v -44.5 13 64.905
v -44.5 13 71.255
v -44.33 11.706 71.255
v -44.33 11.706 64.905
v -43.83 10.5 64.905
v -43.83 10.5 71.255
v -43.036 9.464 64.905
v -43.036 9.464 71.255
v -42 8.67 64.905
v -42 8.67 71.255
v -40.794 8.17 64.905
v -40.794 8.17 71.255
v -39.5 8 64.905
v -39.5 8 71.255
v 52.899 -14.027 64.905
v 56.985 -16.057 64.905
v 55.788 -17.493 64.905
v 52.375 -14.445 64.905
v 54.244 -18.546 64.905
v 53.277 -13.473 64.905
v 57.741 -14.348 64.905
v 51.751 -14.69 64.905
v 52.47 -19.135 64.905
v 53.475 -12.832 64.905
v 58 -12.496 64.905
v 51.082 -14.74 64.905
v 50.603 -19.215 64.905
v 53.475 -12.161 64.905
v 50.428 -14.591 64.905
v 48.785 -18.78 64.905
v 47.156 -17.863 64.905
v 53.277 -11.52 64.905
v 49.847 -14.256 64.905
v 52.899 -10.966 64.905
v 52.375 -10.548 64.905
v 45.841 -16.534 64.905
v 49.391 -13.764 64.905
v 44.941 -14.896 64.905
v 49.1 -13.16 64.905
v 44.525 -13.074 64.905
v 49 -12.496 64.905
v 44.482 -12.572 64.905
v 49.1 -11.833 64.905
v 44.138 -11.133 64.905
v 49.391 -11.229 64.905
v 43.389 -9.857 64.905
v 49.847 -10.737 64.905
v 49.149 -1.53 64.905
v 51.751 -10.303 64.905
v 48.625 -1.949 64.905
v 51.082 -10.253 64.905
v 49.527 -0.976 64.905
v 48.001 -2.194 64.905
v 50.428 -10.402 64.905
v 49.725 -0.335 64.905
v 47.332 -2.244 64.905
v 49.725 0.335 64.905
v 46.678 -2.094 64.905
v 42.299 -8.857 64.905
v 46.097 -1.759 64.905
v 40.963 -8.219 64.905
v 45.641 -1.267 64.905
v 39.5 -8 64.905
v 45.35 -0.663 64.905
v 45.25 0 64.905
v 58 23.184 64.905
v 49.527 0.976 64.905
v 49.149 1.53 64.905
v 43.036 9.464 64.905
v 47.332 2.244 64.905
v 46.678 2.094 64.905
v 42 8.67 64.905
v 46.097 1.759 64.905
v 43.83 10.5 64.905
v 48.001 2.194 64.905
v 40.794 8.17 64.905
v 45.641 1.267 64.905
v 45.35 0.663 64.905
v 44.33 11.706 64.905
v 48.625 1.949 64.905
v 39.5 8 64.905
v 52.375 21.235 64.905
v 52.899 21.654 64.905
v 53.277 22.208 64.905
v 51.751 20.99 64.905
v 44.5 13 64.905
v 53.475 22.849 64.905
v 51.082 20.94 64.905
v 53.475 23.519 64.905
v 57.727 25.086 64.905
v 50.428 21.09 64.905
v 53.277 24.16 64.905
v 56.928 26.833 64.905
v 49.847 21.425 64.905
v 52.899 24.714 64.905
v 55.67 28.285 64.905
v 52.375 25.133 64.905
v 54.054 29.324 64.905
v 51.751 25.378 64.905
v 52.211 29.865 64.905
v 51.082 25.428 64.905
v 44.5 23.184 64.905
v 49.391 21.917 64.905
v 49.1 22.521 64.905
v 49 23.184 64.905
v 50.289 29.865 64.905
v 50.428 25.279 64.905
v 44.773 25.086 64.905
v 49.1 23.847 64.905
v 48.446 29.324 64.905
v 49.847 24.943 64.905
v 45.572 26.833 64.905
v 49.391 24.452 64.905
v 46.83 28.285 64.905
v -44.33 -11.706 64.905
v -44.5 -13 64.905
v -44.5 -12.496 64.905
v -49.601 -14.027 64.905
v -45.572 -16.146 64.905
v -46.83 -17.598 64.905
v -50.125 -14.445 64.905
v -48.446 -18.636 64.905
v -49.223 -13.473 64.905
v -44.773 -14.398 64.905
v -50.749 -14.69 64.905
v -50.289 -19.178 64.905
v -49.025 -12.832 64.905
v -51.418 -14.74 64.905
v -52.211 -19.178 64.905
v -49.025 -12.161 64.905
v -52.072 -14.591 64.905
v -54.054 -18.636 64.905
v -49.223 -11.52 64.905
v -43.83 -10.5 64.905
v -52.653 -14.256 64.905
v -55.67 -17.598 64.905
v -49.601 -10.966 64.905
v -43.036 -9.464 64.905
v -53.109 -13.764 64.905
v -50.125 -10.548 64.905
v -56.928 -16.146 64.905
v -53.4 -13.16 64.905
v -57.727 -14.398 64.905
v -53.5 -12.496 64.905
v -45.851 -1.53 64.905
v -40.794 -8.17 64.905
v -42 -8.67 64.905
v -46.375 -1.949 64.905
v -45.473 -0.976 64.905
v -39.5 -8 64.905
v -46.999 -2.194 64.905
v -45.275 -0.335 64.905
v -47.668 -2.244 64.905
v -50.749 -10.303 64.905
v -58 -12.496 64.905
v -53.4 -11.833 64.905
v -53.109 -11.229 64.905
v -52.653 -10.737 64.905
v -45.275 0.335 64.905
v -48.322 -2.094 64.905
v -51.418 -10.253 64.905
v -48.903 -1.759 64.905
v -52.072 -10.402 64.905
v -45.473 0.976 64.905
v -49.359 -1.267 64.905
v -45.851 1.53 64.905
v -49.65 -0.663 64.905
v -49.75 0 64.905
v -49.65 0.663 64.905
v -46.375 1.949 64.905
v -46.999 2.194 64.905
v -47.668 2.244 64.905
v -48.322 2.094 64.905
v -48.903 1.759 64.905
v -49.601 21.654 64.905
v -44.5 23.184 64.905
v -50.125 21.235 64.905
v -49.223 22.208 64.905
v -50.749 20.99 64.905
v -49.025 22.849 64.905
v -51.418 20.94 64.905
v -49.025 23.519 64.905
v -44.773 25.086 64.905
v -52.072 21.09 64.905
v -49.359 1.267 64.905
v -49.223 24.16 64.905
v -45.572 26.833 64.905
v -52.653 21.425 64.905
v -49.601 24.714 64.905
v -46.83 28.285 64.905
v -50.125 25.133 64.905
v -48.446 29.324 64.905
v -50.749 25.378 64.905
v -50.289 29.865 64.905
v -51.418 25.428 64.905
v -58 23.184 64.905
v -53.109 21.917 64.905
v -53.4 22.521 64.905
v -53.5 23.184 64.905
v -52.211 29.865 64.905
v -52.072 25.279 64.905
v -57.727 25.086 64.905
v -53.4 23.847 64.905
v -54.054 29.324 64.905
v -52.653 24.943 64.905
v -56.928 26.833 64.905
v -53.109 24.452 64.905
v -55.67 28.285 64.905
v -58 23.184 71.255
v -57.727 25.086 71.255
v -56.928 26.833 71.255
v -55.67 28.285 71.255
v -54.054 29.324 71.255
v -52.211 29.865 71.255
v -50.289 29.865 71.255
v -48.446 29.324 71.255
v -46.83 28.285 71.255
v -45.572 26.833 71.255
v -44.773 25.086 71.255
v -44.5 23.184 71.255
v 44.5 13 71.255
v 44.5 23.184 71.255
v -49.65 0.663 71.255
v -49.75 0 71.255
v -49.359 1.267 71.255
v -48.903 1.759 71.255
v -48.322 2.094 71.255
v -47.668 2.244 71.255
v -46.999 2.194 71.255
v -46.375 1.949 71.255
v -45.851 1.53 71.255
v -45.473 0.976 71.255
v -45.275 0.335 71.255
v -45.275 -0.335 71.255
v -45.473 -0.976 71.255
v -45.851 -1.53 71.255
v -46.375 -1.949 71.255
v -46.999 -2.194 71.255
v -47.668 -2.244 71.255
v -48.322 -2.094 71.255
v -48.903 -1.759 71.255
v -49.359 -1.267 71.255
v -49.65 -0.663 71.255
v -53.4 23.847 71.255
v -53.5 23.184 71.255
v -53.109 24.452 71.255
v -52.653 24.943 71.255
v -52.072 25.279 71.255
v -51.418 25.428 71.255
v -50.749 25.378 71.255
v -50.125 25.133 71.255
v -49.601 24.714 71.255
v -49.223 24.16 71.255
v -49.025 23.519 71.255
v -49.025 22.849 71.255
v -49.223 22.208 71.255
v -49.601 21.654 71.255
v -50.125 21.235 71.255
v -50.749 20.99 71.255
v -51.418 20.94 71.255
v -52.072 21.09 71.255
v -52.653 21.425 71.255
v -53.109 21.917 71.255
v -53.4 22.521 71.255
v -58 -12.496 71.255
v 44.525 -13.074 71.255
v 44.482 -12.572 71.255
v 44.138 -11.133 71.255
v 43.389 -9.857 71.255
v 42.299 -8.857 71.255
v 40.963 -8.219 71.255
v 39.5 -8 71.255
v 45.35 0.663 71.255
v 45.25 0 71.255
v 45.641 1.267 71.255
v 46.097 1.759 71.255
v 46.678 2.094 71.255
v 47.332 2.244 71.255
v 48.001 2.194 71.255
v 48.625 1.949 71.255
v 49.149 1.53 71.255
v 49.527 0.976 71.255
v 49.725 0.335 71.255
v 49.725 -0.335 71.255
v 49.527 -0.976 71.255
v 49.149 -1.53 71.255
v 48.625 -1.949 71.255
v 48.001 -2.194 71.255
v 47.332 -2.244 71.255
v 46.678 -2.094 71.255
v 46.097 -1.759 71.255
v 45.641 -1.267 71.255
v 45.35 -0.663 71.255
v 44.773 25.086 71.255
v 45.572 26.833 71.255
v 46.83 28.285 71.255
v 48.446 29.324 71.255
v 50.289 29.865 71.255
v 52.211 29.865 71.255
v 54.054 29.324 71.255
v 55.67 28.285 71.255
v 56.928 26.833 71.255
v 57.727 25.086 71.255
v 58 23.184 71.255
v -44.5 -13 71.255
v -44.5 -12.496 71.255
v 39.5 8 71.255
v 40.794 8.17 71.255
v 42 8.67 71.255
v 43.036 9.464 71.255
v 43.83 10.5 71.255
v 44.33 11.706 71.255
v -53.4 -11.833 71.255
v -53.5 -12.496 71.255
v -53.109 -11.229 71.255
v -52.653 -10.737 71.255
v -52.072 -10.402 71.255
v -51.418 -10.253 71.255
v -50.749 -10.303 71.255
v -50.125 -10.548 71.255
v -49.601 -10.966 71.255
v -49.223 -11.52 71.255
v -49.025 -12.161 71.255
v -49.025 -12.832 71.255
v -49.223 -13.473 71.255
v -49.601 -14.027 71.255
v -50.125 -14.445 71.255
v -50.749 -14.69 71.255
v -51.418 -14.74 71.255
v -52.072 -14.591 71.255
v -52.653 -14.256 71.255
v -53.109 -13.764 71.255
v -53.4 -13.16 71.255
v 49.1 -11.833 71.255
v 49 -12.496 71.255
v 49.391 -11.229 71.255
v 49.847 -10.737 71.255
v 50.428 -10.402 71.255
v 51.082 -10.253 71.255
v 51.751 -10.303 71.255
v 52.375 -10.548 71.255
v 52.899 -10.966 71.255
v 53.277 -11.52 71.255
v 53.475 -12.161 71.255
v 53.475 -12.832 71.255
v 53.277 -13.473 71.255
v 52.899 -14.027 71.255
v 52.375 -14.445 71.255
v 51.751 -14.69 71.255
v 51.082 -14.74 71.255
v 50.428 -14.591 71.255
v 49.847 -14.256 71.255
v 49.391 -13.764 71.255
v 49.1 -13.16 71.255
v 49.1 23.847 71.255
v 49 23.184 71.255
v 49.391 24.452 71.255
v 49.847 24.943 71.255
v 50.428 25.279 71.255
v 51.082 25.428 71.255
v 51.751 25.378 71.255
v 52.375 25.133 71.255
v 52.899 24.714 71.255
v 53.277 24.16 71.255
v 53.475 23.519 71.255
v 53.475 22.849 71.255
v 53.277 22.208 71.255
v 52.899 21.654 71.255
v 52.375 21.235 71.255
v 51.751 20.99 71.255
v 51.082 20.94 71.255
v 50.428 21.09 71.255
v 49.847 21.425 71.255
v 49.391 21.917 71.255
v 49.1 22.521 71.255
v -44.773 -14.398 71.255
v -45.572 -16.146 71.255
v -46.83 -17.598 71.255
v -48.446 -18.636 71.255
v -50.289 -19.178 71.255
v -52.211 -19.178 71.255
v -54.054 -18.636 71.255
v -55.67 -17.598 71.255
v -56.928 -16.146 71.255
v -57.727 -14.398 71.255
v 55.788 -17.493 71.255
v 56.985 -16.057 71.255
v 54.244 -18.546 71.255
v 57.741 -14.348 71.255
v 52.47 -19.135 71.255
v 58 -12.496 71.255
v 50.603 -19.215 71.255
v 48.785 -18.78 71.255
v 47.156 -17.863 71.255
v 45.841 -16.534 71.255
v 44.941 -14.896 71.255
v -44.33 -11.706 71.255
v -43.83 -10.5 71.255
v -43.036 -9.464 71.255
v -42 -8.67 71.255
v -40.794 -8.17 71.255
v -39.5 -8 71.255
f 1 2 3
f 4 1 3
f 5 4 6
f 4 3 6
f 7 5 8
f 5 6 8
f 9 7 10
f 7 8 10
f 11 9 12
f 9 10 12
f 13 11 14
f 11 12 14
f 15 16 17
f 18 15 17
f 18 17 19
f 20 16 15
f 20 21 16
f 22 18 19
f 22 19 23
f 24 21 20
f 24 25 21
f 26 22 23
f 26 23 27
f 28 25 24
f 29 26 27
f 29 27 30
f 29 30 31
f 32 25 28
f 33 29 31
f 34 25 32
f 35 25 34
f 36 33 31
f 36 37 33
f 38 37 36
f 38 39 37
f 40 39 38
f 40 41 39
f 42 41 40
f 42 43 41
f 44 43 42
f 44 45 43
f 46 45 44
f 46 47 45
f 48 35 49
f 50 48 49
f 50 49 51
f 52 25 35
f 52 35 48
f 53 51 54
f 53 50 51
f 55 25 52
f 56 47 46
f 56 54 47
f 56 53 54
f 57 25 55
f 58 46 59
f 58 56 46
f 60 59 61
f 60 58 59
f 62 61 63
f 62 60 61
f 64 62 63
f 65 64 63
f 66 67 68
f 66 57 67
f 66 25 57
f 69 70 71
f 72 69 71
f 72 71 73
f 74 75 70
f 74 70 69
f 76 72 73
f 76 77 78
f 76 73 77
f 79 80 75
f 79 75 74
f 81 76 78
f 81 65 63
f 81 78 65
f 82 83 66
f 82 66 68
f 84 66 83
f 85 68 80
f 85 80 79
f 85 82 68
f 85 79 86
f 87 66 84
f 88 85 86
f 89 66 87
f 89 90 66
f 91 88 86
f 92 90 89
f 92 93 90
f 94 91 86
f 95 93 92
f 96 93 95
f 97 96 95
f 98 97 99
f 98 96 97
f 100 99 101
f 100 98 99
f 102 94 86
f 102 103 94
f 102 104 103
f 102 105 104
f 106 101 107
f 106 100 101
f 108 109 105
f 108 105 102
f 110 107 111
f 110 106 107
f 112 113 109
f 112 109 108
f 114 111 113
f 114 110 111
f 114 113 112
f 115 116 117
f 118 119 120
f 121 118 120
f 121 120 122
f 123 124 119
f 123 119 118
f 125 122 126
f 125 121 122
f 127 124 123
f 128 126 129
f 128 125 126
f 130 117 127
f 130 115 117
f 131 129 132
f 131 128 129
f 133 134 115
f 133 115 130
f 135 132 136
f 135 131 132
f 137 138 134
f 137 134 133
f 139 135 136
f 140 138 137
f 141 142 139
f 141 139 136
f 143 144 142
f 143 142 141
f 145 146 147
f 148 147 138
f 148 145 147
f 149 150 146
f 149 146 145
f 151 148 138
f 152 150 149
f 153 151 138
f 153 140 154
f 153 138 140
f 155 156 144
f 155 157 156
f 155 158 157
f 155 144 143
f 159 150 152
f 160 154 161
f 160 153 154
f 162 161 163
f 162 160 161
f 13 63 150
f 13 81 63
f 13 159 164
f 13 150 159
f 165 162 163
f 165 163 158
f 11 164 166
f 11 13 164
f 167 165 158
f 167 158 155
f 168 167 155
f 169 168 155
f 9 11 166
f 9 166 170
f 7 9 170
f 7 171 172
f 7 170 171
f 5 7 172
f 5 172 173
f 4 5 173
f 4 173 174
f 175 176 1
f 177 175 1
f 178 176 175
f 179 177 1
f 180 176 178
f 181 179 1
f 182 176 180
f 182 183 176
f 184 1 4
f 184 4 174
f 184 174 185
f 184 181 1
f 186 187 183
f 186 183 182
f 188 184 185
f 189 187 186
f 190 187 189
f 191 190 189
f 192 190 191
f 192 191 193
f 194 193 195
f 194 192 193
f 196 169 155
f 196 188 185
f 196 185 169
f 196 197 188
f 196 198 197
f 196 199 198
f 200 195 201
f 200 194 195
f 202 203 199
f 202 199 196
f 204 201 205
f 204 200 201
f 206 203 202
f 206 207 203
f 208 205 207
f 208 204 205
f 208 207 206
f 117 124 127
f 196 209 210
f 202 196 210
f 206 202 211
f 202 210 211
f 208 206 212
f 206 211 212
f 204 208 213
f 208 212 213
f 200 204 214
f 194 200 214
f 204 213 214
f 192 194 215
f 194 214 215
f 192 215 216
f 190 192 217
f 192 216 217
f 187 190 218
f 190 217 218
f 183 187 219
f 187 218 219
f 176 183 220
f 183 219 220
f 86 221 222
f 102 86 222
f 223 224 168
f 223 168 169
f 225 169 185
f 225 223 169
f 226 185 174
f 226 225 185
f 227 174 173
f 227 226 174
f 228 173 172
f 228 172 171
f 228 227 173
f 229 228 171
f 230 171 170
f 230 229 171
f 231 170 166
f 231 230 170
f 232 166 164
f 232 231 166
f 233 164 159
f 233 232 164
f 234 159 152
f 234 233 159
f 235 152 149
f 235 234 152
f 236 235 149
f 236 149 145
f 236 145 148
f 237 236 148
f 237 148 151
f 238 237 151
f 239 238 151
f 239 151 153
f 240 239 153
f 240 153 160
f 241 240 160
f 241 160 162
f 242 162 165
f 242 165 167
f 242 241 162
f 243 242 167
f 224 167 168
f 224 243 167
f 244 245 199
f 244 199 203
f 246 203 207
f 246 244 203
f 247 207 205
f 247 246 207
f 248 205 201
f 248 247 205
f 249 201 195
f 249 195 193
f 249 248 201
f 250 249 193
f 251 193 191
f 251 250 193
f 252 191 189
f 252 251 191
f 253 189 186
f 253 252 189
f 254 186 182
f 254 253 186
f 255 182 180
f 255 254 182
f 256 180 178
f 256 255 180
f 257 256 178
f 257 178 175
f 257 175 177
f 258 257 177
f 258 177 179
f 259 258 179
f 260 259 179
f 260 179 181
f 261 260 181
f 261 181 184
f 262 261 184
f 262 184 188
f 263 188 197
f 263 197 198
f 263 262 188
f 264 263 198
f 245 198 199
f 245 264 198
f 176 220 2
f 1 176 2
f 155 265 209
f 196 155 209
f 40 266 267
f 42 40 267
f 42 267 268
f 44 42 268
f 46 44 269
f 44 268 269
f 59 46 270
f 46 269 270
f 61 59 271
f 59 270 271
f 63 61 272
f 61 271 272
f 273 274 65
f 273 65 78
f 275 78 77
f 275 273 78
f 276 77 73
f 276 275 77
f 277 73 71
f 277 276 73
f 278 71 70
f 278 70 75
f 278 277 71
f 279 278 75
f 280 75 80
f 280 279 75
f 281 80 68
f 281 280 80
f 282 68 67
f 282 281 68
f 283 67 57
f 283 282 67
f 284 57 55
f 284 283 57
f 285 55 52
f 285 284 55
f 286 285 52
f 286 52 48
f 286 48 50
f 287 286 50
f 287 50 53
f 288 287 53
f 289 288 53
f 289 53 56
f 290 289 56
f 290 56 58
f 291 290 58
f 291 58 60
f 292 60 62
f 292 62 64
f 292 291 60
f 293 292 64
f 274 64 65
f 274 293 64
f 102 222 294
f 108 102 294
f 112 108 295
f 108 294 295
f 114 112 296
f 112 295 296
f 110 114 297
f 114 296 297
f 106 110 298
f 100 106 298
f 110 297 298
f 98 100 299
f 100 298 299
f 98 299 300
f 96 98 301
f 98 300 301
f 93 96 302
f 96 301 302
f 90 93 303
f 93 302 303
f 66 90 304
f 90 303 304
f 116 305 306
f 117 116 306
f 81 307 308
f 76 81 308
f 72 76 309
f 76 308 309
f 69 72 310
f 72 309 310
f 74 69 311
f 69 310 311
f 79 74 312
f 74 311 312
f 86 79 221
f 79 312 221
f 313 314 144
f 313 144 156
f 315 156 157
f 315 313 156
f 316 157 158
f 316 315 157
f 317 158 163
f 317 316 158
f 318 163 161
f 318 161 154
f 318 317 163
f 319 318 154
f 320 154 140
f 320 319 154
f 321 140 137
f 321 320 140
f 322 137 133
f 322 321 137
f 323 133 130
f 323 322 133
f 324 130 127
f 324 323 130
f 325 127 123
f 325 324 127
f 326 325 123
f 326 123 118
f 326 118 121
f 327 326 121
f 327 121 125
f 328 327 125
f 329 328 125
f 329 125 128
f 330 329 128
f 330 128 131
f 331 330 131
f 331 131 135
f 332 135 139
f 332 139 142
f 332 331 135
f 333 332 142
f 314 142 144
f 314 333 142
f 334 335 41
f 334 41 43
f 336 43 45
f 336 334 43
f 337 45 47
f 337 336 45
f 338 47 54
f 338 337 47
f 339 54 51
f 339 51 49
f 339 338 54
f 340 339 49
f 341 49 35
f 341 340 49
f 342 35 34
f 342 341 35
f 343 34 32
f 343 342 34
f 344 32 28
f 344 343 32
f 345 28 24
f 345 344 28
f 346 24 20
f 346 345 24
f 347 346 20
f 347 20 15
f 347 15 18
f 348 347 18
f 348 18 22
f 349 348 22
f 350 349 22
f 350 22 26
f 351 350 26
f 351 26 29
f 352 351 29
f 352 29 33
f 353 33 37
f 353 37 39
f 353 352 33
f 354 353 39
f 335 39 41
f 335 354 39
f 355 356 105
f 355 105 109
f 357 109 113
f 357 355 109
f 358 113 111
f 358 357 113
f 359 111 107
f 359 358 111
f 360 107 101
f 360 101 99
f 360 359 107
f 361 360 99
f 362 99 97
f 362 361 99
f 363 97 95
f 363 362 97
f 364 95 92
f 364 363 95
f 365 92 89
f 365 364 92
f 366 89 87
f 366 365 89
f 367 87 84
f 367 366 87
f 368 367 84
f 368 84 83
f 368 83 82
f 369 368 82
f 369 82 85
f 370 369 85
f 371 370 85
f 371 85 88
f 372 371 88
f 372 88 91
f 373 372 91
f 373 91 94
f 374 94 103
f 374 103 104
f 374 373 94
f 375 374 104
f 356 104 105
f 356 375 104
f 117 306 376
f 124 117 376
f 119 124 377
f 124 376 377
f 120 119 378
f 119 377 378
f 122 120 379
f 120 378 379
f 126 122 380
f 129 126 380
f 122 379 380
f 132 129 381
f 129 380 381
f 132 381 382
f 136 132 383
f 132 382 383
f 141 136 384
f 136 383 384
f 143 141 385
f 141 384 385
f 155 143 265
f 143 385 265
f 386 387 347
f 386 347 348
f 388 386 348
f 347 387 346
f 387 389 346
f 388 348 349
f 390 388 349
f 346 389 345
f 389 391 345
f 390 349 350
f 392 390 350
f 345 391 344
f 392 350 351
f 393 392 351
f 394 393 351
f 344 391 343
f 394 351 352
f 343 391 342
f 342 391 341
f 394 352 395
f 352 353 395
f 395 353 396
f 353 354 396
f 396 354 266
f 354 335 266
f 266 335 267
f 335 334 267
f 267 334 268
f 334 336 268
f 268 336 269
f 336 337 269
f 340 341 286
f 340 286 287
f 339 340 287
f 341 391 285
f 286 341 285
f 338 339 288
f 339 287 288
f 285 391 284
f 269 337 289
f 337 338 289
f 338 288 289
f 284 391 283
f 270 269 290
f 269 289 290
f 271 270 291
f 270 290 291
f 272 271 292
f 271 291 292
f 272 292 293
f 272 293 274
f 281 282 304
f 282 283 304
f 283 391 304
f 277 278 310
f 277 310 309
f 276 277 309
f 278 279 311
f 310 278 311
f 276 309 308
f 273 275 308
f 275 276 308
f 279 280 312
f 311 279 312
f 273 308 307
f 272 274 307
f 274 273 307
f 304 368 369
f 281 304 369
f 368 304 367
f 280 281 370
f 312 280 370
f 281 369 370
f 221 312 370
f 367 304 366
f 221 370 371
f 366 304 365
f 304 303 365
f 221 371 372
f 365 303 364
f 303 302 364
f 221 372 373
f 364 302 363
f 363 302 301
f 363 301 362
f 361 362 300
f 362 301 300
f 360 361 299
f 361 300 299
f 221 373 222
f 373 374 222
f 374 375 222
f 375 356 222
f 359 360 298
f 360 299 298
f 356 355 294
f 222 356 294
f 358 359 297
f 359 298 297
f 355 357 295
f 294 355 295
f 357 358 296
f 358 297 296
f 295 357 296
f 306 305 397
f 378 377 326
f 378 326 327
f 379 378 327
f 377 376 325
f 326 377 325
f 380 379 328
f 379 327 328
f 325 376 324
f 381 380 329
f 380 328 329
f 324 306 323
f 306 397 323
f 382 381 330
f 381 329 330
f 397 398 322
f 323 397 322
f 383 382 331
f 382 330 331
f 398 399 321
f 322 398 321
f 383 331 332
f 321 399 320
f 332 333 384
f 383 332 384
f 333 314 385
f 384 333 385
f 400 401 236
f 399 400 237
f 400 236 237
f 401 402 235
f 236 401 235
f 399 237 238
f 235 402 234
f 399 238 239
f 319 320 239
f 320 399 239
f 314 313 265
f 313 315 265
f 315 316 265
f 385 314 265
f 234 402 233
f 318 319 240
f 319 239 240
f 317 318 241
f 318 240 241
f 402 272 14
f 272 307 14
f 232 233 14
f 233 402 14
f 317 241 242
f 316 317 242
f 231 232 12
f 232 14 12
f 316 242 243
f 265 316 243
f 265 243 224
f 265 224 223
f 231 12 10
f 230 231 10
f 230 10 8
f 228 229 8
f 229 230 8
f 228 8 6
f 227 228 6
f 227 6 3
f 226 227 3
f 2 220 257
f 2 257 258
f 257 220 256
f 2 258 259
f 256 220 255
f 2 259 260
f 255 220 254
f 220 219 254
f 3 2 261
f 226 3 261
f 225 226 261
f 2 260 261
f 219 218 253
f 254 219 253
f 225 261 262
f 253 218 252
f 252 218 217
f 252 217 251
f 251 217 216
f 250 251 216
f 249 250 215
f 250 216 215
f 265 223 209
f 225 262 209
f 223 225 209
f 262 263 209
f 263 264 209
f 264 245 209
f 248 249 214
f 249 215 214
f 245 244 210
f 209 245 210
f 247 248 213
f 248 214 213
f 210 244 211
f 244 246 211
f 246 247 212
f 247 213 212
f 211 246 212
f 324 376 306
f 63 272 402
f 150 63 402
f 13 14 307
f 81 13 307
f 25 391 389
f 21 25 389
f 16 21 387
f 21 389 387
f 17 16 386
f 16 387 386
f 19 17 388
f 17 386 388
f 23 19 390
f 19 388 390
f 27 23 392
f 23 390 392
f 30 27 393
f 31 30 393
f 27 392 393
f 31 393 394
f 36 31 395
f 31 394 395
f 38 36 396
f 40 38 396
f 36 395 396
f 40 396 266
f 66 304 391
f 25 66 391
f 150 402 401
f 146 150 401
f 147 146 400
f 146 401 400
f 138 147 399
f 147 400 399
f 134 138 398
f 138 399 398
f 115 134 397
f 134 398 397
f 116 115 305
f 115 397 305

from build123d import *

# Parameters (mm, degrees)
SKETCH2_R           = 2.25
BOSS_EXTRUDE1_DEPTH = 6.35


with BuildPart() as part:
    # Sketch2 → Boss-Extrude1 (new body)
    with BuildSketch(Plane(origin=(0, 0, 71.255), x_dir=(-1, 0, 0), z_dir=(0, 0, -1))):
        with BuildLine():
            Line((-39.5, -8), (39.5, -8))
            ThreePointArc((39.5, -8), (43.035533906, -9.464466094), (44.5, -13))
            Line((44.5, -13), (44.5, -12.496398734))
            ThreePointArc((44.5, -12.496398734), (51.25, -19.246398734), (58, -12.496398734))
            Line((58, -12.496398734), (58, 23.184046239))
            ThreePointArc((58, 23.184046239), (51.25, 29.934046239), (44.5, 23.184046239))
            Line((44.5, 23.184046239), (44.5, 13))
            ThreePointArc((44.5, 13), (43.035533906, 9.464466094), (39.5, 8))
            Line((39.5, 8), (-39.5, 8))
            ThreePointArc((-39.5, 8), (-43.035533906, 9.464466094), (-44.5, 13))
            Line((-44.5, 13), (-44.5, 23.184046239))
            ThreePointArc((-44.5, 23.184046239), (-51.25, 29.934046239), (-58, 23.184046239))
            Line((-58, 23.184046239), (-58, -12.496398734))
            ThreePointArc((-58, -12.496398734), (-51.539037503, -19.240207548), (-44.524753386, -13.073943522))
            Line((-44.524753386, -13.073943522), (-44.481664158, -12.572189046))
            ThreePointArc((-44.481664158, -12.572189046), (-42.880898196, -9.316316058), (-39.5, -8))
        make_face()
        with Locations((47.5, 0)):
            Circle(SKETCH2_R, mode=Mode.SUBTRACT)
        with Locations((-47.5, 0)):
            Circle(SKETCH2_R, mode=Mode.SUBTRACT)
        with Locations((51.25, 23.184046239)):
            Circle(SKETCH2_R, mode=Mode.SUBTRACT)
        with Locations((51.25, -12.496398734)):
            Circle(SKETCH2_R, mode=Mode.SUBTRACT)
        with Locations((-51.25, -12.496398734)):
            Circle(SKETCH2_R, mode=Mode.SUBTRACT)
        with Locations((-51.25, 23.184046239)):
            Circle(SKETCH2_R, mode=Mode.SUBTRACT)
    extrude(amount=BOSS_EXTRUDE1_DEPTH)


solid = part.part
